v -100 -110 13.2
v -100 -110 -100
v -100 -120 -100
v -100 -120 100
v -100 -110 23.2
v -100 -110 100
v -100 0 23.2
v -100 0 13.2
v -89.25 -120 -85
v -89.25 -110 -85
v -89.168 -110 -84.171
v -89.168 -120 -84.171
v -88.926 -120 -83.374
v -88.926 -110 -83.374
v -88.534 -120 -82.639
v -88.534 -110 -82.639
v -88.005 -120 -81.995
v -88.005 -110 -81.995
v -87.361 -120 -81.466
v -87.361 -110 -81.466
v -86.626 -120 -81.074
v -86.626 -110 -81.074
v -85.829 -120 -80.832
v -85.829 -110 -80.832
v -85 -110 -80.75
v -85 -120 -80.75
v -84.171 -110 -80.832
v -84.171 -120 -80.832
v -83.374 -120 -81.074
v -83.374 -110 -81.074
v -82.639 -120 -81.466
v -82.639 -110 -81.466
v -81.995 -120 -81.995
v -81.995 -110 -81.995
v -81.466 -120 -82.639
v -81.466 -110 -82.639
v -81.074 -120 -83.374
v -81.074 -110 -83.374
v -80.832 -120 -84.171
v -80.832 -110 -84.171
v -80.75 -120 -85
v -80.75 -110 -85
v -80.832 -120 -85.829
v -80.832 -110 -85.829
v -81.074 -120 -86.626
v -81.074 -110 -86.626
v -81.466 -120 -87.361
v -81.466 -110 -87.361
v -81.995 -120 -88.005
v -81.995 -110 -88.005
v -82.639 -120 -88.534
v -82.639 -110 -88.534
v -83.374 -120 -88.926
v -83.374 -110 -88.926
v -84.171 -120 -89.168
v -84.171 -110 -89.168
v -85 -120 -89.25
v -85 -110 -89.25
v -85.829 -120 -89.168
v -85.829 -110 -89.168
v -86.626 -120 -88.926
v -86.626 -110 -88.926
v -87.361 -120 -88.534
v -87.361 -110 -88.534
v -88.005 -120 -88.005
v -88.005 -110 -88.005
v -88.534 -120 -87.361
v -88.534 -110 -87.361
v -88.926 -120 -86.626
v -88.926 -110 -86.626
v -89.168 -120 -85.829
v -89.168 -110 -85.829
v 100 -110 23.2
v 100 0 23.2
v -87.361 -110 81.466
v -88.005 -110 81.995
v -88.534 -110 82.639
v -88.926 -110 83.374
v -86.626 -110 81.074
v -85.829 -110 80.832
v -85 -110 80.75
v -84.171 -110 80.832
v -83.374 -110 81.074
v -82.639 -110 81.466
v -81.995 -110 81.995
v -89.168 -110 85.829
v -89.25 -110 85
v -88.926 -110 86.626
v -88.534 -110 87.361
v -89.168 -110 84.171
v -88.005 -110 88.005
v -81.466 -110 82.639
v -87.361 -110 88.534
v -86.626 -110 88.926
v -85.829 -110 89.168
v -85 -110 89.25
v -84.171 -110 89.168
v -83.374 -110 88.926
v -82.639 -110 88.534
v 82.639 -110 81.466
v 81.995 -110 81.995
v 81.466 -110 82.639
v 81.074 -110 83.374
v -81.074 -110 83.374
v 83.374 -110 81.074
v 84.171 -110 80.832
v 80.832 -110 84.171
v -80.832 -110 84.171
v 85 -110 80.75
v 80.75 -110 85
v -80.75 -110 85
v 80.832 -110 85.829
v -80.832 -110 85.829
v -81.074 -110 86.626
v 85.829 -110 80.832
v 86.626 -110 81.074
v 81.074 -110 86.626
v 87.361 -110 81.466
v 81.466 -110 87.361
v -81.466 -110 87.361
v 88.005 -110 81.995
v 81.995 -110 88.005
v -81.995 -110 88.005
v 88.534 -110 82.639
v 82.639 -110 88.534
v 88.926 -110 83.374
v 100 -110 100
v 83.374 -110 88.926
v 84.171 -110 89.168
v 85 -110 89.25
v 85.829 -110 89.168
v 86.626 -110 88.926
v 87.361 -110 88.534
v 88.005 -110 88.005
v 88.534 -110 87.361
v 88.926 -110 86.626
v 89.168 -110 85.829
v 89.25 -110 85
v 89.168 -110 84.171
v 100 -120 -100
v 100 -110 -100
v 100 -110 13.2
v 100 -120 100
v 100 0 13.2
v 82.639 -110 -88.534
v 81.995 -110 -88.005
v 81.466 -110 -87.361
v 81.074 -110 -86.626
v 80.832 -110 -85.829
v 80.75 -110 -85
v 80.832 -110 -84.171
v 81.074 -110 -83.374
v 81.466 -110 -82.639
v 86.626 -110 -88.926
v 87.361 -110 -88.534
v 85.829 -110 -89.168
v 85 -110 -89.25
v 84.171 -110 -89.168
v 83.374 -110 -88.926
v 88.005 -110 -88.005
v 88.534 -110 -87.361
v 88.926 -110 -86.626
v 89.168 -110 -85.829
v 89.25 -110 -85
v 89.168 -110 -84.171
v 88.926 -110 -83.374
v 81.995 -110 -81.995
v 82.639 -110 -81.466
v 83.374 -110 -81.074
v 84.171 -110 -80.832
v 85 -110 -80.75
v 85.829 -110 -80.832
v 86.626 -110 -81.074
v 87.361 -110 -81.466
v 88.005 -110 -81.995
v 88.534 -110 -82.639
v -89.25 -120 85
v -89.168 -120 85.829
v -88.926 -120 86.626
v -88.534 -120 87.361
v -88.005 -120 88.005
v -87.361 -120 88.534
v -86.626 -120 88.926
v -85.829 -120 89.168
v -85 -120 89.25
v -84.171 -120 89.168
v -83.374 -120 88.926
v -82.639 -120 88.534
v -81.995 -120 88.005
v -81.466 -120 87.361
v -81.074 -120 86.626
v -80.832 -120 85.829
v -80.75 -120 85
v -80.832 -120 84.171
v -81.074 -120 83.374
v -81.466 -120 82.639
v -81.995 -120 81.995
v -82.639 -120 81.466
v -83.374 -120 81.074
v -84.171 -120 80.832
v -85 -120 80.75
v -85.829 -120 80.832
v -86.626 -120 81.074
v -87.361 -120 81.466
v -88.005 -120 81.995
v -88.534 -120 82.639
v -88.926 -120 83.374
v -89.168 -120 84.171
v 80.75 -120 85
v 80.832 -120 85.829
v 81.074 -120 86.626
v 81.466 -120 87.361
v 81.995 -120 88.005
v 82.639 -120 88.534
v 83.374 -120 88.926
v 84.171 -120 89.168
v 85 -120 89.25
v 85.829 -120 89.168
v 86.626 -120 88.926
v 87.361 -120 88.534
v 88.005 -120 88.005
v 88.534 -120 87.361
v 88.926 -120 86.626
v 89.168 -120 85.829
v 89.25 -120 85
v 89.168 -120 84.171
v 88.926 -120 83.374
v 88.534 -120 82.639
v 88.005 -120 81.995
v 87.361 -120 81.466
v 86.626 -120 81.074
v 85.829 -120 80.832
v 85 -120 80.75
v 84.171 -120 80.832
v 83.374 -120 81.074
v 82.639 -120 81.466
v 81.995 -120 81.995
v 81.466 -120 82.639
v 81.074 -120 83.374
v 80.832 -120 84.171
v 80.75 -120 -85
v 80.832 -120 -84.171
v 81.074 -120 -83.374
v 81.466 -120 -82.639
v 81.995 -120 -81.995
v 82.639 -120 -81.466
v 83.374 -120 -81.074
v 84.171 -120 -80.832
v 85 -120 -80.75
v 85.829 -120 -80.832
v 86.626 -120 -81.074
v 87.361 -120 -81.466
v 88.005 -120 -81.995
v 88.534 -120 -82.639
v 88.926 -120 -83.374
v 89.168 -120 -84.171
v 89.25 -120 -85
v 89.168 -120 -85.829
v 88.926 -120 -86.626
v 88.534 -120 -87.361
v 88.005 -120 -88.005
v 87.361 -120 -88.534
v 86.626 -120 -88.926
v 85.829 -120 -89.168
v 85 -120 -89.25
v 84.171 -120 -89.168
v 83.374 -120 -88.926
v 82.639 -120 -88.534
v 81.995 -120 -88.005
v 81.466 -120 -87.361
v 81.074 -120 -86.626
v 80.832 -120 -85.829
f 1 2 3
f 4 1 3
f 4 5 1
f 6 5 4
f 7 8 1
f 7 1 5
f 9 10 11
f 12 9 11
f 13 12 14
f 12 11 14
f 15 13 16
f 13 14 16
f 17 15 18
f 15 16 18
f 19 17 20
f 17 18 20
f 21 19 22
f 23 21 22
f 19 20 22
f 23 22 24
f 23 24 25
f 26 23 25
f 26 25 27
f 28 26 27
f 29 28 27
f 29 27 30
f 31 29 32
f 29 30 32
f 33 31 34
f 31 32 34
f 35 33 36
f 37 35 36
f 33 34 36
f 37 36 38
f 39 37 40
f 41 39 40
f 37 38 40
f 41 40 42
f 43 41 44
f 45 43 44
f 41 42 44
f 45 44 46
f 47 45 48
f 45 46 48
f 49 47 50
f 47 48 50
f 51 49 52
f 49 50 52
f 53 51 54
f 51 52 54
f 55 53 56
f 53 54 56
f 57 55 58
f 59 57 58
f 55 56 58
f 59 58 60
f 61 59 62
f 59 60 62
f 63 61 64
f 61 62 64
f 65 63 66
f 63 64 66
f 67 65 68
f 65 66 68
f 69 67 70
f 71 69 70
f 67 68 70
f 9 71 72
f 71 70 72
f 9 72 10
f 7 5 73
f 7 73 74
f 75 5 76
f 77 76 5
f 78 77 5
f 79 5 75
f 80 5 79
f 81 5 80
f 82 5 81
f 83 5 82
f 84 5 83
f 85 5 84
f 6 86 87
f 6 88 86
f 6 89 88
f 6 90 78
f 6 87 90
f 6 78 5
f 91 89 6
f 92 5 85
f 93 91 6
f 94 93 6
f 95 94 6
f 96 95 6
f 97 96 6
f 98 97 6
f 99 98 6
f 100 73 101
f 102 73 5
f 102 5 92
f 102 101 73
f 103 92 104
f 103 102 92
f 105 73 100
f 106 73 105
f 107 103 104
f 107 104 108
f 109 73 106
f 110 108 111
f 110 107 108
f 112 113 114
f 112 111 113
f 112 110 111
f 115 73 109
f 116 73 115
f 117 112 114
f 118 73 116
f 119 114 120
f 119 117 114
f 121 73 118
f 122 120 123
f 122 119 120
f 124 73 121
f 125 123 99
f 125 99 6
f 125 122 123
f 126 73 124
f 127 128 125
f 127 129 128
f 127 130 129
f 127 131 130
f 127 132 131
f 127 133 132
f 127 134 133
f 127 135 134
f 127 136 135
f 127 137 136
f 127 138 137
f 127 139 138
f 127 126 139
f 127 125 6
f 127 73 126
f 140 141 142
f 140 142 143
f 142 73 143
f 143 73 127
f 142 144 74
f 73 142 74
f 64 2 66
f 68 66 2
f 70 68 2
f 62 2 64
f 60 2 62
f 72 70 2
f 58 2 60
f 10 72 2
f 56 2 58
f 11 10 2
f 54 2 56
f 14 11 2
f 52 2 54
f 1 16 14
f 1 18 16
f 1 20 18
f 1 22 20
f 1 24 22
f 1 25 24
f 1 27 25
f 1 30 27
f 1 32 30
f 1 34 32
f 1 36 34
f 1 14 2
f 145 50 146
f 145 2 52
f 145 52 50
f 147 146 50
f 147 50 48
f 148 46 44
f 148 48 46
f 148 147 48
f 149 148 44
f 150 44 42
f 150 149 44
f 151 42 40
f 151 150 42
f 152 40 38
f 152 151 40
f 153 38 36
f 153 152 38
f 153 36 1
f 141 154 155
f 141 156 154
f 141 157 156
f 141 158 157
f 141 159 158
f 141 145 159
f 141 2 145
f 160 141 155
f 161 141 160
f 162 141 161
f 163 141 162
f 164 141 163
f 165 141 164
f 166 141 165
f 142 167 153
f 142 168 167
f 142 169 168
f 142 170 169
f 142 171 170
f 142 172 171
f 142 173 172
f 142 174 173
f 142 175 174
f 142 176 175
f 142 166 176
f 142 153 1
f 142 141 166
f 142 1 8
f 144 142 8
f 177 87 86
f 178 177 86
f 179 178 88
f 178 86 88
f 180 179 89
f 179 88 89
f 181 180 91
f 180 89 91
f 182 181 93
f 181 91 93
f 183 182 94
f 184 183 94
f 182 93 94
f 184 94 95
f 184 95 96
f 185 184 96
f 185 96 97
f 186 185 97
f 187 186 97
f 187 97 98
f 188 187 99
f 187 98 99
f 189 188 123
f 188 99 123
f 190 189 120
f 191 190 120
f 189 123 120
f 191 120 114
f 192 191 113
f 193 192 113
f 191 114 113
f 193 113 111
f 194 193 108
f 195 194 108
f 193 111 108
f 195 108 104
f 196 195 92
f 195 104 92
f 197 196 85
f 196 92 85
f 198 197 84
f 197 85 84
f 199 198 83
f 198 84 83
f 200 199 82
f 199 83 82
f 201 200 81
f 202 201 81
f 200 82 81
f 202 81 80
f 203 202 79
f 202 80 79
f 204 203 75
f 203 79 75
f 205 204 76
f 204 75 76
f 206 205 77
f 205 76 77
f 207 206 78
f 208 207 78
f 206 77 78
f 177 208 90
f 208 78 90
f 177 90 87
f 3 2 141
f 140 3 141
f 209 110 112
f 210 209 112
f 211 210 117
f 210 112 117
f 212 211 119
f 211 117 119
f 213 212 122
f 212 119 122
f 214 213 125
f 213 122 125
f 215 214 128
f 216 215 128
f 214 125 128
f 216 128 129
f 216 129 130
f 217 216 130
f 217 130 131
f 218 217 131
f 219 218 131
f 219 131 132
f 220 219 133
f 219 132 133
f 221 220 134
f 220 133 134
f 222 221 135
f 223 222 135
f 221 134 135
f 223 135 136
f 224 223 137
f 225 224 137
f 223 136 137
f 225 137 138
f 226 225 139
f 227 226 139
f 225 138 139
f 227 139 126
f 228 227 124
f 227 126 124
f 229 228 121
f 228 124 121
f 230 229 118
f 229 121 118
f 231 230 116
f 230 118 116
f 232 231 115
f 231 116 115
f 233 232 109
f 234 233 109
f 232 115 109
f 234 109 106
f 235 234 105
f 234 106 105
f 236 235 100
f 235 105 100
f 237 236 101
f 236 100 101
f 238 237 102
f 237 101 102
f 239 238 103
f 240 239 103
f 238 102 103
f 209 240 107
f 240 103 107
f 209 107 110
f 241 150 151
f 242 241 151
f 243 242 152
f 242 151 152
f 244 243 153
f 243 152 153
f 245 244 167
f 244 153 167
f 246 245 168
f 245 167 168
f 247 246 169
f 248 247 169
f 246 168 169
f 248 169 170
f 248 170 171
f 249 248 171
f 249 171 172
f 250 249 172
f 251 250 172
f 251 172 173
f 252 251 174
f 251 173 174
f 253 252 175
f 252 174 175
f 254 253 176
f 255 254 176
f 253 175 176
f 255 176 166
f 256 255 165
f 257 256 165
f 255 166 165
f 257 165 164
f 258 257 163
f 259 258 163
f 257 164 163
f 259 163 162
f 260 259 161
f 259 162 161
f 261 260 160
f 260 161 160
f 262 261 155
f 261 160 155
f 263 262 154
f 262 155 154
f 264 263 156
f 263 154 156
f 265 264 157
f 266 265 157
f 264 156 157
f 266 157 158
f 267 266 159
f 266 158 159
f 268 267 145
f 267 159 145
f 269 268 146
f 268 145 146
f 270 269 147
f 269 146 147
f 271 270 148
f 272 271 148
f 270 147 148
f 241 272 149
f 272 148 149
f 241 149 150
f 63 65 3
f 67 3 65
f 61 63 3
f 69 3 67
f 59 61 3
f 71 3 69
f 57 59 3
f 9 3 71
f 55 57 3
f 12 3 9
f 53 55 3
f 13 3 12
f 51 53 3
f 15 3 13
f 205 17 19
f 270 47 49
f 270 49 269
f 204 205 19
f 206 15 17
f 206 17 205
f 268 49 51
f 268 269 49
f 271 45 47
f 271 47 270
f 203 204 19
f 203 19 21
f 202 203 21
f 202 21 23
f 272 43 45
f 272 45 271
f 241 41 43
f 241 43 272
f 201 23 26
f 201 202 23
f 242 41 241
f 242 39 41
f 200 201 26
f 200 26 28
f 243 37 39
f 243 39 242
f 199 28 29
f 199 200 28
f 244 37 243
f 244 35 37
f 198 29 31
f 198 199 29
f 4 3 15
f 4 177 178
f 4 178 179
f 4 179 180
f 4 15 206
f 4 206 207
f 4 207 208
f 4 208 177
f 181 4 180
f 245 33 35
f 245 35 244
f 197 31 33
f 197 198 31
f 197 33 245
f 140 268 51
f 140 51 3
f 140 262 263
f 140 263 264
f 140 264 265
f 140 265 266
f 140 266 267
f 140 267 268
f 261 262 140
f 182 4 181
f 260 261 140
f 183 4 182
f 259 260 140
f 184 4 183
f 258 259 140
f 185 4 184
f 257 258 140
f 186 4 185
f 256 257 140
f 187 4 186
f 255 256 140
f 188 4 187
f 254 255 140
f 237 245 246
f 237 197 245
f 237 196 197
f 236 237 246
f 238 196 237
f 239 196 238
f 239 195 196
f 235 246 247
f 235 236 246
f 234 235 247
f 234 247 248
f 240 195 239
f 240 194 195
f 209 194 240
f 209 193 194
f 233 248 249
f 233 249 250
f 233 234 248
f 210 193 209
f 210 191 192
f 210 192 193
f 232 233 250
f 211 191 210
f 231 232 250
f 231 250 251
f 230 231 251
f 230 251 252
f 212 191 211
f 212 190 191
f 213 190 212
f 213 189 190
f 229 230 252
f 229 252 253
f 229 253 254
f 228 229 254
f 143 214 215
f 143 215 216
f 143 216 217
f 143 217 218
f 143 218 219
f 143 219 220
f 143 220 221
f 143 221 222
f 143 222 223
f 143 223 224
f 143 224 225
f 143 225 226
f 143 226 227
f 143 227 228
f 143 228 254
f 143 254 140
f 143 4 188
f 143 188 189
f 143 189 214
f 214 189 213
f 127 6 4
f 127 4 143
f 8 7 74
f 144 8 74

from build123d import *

# Parameters (mm, degrees)
F0_W      = 200
F0_H      = 200
F1_DEPTH  = 120
F2_W      = 110
F2_H      = 76.8
F2_H_2    = 113.2
F3_DEPTH  = 200
F5_R      = 4.25
F6_DEPTH  = 10
F7_R      = 4.25
F8_DEPTH  = 10
F9_R      = 4.25
F10_DEPTH = 10


with BuildPart() as f1:
    # F0 (on Front) → F1 (new body)
    with BuildSketch(Plane.XZ):
        Rectangle(F0_W, F0_H)
    extrude(amount=F1_DEPTH)

    # F2 (on face) → F3 (cut)
    with BuildSketch(Plane.YZ.offset(100)):
        with Locations((-55, 61.6)):
            Rectangle(F2_W, F2_H)
        with Locations((-55, -43.4)):
            Rectangle(F2_W, F2_H_2)
    extrude(amount=-F3_DEPTH, mode=Mode.SUBTRACT)

    # F5 (on face) → F6 (cut)
    with BuildSketch(Plane(origin=(0, -110, 0), x_dir=(-1, 0, 0), z_dir=(0, 1, 0))):
        with Locations((-85, 85)):
            Circle(F5_R)
        with Locations((85, 85)):
            Circle(F5_R)
    extrude(amount=-F6_DEPTH, mode=Mode.SUBTRACT)

    # F7 (on face) → F8 (cut)
    with BuildSketch(Plane(origin=(0, -110, 0), x_dir=(-1, 0, 0), z_dir=(0, 1, 0))):
        with Locations((-85, -85)):
            Circle(F7_R)
    extrude(amount=-F8_DEPTH, mode=Mode.SUBTRACT)

    # F9 (on face) → F10 (cut)
    with BuildSketch(Plane(origin=(0, -110, 0), x_dir=(-1, 0, 0), z_dir=(0, 1, 0))):
        with Locations((85, -85)):
            Circle(F9_R)
    extrude(amount=-F10_DEPTH, mode=Mode.SUBTRACT)


solid = f1.part
